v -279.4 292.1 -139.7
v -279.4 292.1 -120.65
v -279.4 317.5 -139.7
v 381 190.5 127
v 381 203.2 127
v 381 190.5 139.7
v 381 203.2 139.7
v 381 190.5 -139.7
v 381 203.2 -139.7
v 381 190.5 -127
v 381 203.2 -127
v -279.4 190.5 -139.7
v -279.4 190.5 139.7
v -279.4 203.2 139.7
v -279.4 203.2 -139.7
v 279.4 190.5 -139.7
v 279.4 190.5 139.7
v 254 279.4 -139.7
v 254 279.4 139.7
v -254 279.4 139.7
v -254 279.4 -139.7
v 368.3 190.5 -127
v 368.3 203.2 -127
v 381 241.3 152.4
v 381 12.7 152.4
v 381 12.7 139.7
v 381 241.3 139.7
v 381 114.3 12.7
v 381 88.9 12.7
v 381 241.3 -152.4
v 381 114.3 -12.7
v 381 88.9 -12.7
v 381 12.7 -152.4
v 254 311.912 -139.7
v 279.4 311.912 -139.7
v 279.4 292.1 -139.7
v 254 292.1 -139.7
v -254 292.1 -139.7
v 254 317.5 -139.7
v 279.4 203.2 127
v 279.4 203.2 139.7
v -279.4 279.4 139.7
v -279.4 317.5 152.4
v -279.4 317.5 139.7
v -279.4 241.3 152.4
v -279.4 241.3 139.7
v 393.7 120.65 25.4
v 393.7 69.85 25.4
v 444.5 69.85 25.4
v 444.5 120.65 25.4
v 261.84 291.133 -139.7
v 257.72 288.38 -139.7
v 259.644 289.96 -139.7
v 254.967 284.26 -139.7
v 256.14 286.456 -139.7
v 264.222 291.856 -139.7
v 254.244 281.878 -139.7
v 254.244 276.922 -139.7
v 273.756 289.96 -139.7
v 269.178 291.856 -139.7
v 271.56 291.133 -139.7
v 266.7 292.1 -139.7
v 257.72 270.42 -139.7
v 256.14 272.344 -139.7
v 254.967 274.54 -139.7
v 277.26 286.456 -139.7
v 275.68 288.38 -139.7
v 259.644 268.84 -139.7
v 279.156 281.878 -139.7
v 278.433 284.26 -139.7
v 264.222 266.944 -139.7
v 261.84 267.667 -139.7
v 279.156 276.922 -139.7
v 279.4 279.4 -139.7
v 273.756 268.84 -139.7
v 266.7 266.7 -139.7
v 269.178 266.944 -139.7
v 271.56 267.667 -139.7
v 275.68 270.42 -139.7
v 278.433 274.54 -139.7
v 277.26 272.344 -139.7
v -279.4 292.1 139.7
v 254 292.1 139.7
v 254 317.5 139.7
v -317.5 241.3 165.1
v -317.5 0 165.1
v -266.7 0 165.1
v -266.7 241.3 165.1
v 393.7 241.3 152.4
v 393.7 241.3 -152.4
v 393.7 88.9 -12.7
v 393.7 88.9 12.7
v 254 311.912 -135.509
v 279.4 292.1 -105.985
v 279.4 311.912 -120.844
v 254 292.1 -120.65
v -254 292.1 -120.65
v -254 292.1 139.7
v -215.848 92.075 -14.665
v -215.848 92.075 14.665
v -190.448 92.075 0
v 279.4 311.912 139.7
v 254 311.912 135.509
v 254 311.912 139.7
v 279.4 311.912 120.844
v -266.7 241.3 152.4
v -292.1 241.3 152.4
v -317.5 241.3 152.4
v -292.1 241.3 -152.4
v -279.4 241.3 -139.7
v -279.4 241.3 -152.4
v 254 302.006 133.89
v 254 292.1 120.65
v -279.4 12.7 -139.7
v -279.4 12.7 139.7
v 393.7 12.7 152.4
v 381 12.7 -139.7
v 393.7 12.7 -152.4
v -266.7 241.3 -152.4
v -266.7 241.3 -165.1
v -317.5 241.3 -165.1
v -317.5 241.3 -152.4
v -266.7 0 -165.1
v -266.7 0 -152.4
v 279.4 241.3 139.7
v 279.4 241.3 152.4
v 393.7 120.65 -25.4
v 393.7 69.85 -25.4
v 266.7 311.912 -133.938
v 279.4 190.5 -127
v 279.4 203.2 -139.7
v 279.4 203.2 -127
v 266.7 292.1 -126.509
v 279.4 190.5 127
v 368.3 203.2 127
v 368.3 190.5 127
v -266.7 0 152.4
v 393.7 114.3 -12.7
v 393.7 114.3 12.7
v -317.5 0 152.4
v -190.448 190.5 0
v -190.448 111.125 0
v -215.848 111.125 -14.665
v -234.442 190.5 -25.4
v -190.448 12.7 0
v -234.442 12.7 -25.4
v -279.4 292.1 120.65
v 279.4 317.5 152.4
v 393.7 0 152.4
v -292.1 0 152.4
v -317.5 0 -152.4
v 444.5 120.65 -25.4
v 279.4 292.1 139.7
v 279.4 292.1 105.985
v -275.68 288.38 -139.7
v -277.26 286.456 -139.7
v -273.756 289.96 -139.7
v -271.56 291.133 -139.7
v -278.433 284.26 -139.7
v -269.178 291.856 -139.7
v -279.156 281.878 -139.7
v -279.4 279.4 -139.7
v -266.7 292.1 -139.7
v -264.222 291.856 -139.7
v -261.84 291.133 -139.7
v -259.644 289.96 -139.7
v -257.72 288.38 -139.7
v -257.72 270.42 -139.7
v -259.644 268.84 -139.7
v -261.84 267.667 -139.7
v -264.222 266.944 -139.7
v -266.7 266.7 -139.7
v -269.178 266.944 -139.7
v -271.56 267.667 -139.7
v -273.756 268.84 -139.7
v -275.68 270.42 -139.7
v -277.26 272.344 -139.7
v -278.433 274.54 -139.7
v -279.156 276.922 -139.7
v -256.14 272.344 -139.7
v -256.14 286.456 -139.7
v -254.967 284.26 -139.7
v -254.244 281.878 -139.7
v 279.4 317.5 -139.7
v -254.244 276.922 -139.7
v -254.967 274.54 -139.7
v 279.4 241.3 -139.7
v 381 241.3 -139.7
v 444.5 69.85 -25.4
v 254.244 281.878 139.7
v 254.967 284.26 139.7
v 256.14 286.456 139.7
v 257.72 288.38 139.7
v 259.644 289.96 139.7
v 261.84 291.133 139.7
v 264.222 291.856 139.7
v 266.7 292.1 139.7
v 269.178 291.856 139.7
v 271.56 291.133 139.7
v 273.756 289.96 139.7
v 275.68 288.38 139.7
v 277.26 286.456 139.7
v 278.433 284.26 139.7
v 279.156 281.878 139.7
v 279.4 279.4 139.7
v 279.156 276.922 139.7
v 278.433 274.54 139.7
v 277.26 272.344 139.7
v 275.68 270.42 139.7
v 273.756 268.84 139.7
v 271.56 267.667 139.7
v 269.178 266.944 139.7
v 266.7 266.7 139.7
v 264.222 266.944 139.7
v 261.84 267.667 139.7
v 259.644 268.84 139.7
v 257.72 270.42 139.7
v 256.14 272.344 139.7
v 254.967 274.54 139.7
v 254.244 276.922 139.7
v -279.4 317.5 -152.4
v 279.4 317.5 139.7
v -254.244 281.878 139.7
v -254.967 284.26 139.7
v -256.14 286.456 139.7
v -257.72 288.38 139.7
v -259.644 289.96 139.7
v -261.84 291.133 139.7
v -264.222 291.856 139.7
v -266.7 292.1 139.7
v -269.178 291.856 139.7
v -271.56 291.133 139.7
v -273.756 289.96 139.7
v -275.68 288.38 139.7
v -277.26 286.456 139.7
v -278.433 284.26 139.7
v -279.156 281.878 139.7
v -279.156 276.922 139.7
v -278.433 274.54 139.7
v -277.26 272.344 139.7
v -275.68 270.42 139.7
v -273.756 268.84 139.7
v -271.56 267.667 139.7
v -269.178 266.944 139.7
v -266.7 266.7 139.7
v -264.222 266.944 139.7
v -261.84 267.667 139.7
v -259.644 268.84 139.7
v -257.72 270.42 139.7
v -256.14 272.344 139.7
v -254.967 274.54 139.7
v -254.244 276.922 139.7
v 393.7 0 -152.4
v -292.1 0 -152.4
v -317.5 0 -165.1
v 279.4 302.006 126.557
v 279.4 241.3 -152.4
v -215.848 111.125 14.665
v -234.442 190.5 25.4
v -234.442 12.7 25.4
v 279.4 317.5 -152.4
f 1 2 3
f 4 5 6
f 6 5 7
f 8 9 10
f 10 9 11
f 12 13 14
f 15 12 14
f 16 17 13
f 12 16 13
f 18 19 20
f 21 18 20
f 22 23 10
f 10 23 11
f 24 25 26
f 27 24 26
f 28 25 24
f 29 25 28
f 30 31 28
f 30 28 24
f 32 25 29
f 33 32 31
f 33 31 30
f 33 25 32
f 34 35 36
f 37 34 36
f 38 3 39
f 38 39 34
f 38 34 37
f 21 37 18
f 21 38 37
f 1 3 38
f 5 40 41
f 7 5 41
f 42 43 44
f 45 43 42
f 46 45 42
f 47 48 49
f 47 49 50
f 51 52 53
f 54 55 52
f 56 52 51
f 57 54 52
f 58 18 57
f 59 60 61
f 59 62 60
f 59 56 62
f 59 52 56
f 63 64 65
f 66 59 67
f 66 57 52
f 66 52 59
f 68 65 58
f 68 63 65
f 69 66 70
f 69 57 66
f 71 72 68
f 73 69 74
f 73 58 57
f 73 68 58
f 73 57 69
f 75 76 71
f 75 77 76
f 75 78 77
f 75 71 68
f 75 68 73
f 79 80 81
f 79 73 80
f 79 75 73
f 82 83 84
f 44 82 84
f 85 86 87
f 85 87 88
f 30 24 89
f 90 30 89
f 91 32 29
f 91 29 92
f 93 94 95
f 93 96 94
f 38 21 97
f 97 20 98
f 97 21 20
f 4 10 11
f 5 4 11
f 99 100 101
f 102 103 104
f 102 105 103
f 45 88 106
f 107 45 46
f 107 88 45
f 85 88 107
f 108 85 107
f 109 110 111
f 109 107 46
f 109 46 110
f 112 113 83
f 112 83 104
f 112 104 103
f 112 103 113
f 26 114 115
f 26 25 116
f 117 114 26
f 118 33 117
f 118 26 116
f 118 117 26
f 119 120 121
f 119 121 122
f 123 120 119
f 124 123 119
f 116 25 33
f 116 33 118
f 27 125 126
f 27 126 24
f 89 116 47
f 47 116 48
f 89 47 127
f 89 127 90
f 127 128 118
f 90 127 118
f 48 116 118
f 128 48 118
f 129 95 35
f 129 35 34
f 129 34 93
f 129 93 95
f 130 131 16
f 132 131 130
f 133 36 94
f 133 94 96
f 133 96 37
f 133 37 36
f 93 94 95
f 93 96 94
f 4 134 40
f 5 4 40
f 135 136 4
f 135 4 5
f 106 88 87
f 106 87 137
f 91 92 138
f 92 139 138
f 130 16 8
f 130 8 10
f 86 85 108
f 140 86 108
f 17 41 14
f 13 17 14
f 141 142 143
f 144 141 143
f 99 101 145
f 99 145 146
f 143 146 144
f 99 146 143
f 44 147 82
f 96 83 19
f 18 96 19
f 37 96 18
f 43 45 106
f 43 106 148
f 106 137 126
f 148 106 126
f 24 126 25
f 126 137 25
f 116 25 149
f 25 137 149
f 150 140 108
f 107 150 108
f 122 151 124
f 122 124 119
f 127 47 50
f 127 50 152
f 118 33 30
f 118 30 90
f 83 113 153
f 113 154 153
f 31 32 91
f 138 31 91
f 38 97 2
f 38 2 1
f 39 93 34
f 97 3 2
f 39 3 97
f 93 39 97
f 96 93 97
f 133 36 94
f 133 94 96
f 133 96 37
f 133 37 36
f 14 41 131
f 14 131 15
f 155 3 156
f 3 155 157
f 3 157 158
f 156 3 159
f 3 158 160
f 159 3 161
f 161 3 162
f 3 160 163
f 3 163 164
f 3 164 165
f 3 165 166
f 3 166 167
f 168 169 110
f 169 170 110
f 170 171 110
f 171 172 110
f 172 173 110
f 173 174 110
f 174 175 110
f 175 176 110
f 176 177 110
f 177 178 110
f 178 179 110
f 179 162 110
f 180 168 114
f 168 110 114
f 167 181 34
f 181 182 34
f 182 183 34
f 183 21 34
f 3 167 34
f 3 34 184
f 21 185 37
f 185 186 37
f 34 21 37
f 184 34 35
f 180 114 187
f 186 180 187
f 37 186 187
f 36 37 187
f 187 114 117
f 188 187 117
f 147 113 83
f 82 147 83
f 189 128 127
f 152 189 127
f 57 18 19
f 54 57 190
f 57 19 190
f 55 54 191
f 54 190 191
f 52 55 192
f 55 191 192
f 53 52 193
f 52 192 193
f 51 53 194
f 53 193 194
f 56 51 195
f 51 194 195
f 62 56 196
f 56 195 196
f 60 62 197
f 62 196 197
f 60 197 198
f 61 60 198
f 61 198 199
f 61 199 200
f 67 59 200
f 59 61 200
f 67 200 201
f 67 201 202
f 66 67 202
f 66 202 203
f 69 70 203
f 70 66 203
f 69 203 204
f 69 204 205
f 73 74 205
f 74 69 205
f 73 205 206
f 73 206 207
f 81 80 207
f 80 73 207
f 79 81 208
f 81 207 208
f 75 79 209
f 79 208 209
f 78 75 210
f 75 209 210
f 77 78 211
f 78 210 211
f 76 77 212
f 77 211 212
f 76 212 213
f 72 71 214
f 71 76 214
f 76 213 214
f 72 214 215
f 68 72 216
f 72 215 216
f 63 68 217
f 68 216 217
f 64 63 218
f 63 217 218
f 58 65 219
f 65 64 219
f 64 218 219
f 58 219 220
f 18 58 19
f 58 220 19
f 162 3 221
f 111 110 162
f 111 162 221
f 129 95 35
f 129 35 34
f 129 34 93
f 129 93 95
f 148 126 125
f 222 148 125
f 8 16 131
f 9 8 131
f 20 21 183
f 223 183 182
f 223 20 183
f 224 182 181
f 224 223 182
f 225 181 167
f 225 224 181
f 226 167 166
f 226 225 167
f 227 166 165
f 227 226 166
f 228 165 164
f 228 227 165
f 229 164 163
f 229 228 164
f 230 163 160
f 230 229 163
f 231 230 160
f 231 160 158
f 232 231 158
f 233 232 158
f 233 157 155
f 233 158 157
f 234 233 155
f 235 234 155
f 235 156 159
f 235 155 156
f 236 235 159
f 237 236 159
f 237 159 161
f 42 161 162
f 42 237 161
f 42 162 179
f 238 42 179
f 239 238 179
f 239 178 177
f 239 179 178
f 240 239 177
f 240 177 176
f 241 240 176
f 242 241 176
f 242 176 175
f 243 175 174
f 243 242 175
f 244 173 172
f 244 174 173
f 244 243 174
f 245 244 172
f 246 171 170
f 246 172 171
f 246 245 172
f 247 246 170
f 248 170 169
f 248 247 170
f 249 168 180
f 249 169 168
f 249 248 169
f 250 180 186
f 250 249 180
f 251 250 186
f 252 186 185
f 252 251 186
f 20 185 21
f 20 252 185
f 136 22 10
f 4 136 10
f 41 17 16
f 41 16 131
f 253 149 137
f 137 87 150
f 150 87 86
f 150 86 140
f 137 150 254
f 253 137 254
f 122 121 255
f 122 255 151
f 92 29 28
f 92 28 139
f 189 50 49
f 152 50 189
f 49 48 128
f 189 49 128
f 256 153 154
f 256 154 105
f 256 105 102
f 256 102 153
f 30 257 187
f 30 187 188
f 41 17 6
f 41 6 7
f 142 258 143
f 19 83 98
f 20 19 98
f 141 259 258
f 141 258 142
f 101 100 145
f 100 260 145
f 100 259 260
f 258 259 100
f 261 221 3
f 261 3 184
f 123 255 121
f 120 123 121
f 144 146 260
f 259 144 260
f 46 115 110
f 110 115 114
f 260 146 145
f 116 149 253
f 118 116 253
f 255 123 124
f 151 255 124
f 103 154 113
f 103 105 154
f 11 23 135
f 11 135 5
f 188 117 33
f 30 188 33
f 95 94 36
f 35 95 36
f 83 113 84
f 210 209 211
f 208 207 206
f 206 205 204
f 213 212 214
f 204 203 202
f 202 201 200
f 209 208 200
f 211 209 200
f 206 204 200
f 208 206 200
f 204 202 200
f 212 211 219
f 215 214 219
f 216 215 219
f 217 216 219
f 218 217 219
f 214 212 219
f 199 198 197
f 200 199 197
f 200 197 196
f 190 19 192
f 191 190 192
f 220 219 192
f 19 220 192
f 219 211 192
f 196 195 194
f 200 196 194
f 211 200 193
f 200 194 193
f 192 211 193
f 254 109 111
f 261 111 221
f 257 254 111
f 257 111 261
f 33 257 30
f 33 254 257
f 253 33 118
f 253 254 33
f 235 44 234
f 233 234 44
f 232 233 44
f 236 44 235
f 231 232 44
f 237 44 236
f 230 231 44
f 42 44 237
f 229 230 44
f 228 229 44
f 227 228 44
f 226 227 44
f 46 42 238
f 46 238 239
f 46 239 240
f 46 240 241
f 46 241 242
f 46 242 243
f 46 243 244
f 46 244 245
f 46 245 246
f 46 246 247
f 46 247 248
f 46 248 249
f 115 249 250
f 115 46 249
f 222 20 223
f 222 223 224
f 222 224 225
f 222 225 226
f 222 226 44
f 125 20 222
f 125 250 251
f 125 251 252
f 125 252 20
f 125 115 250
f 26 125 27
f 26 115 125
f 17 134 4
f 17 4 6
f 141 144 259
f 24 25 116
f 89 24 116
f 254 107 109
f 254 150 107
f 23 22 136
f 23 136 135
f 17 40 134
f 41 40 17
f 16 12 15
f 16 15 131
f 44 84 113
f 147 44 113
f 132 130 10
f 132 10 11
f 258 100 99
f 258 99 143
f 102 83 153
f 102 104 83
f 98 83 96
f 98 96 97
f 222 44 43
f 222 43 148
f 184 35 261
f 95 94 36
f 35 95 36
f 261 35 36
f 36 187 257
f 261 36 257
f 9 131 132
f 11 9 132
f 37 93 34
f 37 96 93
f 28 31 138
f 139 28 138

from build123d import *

# Parameters (mm, degrees)
SKETCH1_W                             = 584.2
SKETCH1_H                             = 304.8
SKETCH1_W_2                           = 101.6
FOND_DEPTH                            = 12.7
SKETCH2_W                             = 660.4
SKETCH2_H                             = 12.7
COT_S_HAUT_DEPTH                      = 228.6
COT_S_HAUT_2_DEPTH                    = 228.6
SKETCH3_W                             = 12.7
SKETCH3_H                             = 304.8
COT_ES_BAS_DEPTH                      = 228.6
COT_ES_BAS_2_DEPTH                    = 228.6
SKETCH4_W                             = 558.8
SKETCH4_H                             = 12.7
SUPPORT_CAGE_DEPTH                    = 76.2
SKETCH5_W                             = 12.7
SKETCH5_H                             = 12.7
SUPPORT_TRAPPE_COT_ES_DEPTH           = 101.6
SUPPORT_TRAPPE_COT_ES_2_DEPTH         = 101.6
SUPPORT_TRAPPE_DEVANT_REACH           = 579.815
SKETCH6_W                             = 12.7
SKETCH6_H                             = 12.7
PLANCHER_MILLIEU_REACH                = 586.062
SKETCH7_W                             = 558.8
SKETCH7_H                             = 12.7
ROULEAU_REACH                         = 586.062
SKETCH8_R                             = 12.7
SKETCH10_W                            = 508
SKETCH10_H                            = 12.7
SOUTIEN_TAPIS_DEPTH                   = 279.4
REBORD_START                          = -25.4
REBORD_TAPIS_DEPTH                    = 533.4
V_POUR_VIS_SANS_FIN_DEPTH             = 177.8
TROU_V_VIS_SANS_FIN_REACH             = 530.235
SKETCH17_W                            = 25.4
SKETCH17_H                            = 19.05
TROU_V_VIS_SANS_FIN_DIRECTION_2_REACH = 530.235
TROU_SORTIE_VIS_SANS_FIN_DEPTH        = 12.7
TROU_SORTIE_VIS_SANS_FIN_DEPTH_BACK   = 12.7
SKETCH18_W                            = 12.7
SKETCH18_H                            = 25.4
SKETCH19_W                            = 12.7
SKETCH19_H                            = 241.3
REBORD_POUR_SAC_POUBELLE_DEPTH        = 25.4
SKETCH31_W                            = 50.8
SKETCH31_H                            = 50.8
BOITE_MOTEUR_VIS_SANS_DEPTH           = 50.8


with BuildPart() as part:
    # Sketch1 → Fond (new body)
    with BuildSketch(Plane(origin=(0, 0, 0), x_dir=(1, 0, 0), z_dir=(0, 1, 0))):
        Rectangle(SKETCH1_W, SKETCH1_H)
        with Locations((342.9, 0)):
            Rectangle(SKETCH1_W_2, SKETCH1_H)
    extrude(amount=FOND_DEPTH)


with BuildPart() as body_2:
    # Sketch2 → Cotés Haut (new body)
    with BuildSketch(Plane(origin=(0, 12.7, 0), x_dir=(1, 0, 0), z_dir=(0, 1, 0))):
        with Locations((50.8, 146.05)):
            Rectangle(SKETCH2_W, SKETCH2_H)
    extrude(amount=COT_S_HAUT_DEPTH)



with BuildPart() as body_3:
    # Sketch2 → Cot_s Haut 2 (new body)
    with BuildSketch(Plane(origin=(0, 12.7, 0), x_dir=(1, 0, 0), z_dir=(0, 1, 0))):
        with Locations((50.8, -146.05)):
            Rectangle(SKETCH2_W, SKETCH2_H)
    extrude(amount=COT_S_HAUT_2_DEPTH)


with BuildPart() as body_4:
    # Sketch3 → Cotées Bas (new body)
    with BuildSketch(Plane(origin=(0, 12.7, 0), x_dir=(1, 0, 0), z_dir=(0, 1, 0))):
        with Locations((-285.75, 0)):
            Rectangle(SKETCH3_W, SKETCH3_H)
    extrude(amount=COT_ES_BAS_DEPTH)


with BuildPart() as body_5:
    # Sketch3 → Cot_es Bas 2 (new body)
    with BuildSketch(Plane(origin=(0, 12.7, 0), x_dir=(1, 0, 0), z_dir=(0, 1, 0))):
        with Locations((387.35, 0)):
            Rectangle(SKETCH3_W, SKETCH3_H)
    extrude(amount=COT_ES_BAS_2_DEPTH)

    # Sketch18 → Trou sortie vis sans fin (cut, two sides: drawn at the far end of the back side and taken through both)
    with BuildSketch(Plane.XY.offset(-TROU_SORTIE_VIS_SANS_FIN_DEPTH_BACK)):
        with Locations((387.35, 101.6)):
            Rectangle(SKETCH18_W, SKETCH18_H)
    extrude(amount=TROU_SORTIE_VIS_SANS_FIN_DEPTH + TROU_SORTIE_VIS_SANS_FIN_DEPTH_BACK, mode=Mode.SUBTRACT)

    # Sketch31 → Boite moteur vis sans (add)
    with BuildSketch(Plane(origin=(393.7, 0, 0), x_dir=(0, 0, -1), z_dir=(1, 0, 0))):
        with Locations((0, 95.25)):
            Rectangle(SKETCH31_W, SKETCH31_H)
    extrude(amount=BOITE_MOTEUR_VIS_SANS_DEPTH)


with BuildPart() as body_2_1:
    add(body_2.part)

    add(body_3.part)  # Support Cage merges body 3
    # Sketch4 → Support Cage (add)
    with BuildSketch(Plane(origin=(0, 241.3, 0), x_dir=(1, 0, 0), z_dir=(0, 1, 0))):
        with Locations((0, 146.05)):
            Rectangle(SKETCH4_W, SKETCH4_H)
        with Locations((0, -146.05)):
            Rectangle(SKETCH4_W, SKETCH4_H)
    extrude(amount=SUPPORT_CAGE_DEPTH)


with BuildPart() as body_5_2:
    # Sketch5 → Support Trappe cotées (new body)
    with BuildSketch(Plane.ZY.offset(-381)):
        with Locations((-133.35, 196.85)):
            Rectangle(SKETCH5_W, SKETCH5_H)
    extrude(amount=SUPPORT_TRAPPE_COT_ES_DEPTH)


with BuildPart() as body_6:
    # Sketch5 → Support Trappe cot_es 2 (new body)
    with BuildSketch(Plane.ZY.offset(-381)):
        with Locations((133.35, 196.85)):
            Rectangle(SKETCH5_W, SKETCH5_H)
    extrude(amount=SUPPORT_TRAPPE_COT_ES_2_DEPTH)


with BuildPart() as body_7:

    # Sketch6 → Support Trappe devant (new, up to next)
    with BuildSketch(Plane.XY.offset(-127), mode=Mode.PRIVATE) as support_trappe_devant_sk1:
        with Locations((374.65, 196.85)):
            Rectangle(SKETCH6_W, SKETCH6_H)
    support_trappe_devant_tool1 = extrude(support_trappe_devant_sk1.sketch, amount=SUPPORT_TRAPPE_DEVANT_REACH, mode=Mode.PRIVATE) - body_6.part
    add(support_trappe_devant_tool1.solids().sort_by_distance((374.65, 196.85, -127))[0])


with BuildPart() as body_8:

    # Sketch7 → Plancher millieu (new, up to next)
    with BuildSketch(Plane(origin=(0, 0, 139.7), x_dir=(-1, 0, 0), z_dir=(0, 0, -1)), mode=Mode.PRIVATE) as plancher_millieu_sk1:
        with Locations((0, 196.85)):
            Rectangle(SKETCH7_W, SKETCH7_H)
    plancher_millieu_tool1 = extrude(plancher_millieu_sk1.sketch, amount=PLANCHER_MILLIEU_REACH, mode=Mode.PRIVATE) - body_2_1.part
    add(plancher_millieu_tool1.solids().sort_by_distance((0, 196.85, 139.7))[0])


with BuildPart() as body_9:

    # Sketch8 → Rouleau (new, up to next)
    with BuildSketch(Plane(origin=(0, 0, 139.7), x_dir=(-1, 0, 0), z_dir=(0, 0, -1)), mode=Mode.PRIVATE) as rouleau_sk1:
        with Locations((-266.7, 279.4)):
            Circle(SKETCH8_R)
    rouleau_tool1 = extrude(rouleau_sk1.sketch, amount=ROULEAU_REACH, mode=Mode.PRIVATE) - body_2_1.part
    rouleau = rouleau_tool1.solids().sort_by_distance((266.7, 279.4, 139.7))[0]
    add(rouleau)


with BuildPart() as body_2_2:
    add(body_2_1.part)

    # Mirror1: Rouleau across plane
    add(rouleau.mirror(Plane(origin=(0, 0, 0), x_dir=(0, 0, 1), z_dir=(1, 0, 0))))

    # Mirror9 2: loft between two sections, ruled curve by curve
    mirror9_2_from = [
        Edge.make_line((279.4, 311.912, -120.844303163), (279.4, 311.912, -139.7)),
        Edge.make_line((279.4, 292.1, -139.7), (279.4, 292.1, -105.985303163)),
        Edge.make_line((279.4, 292.1, -105.985303163), (279.4, 311.912, -120.844303163)),
        Edge.make_line((279.4, 292.1, -139.7), (279.4, 311.912, -139.7)),
    ]
    mirror9_2_to = [
        Edge.make_line((254, 311.912, -135.509), (254, 311.912, -139.7)),
        Edge.make_line((254, 292.1, -139.7), (254, 292.1, -120.65)),
        Edge.make_line((254, 292.1, -120.65), (254, 311.912, -135.509)),
        Edge.make_line((254, 292.1, -139.7), (254, 311.912, -139.7)),
    ]
    mirror9_2 = Solid(Shell([*[Face.make_surface_from_curves(mirror9_2_from[k], mirror9_2_to[k]) for k in range(4)], Face(Wire(mirror9_2_from)), Face(Wire(mirror9_2_to))]))
    add(mirror9_2)


with BuildPart() as body_10:
    # Sketch10 → Soutien tapis (new body)
    with BuildSketch(Plane(origin=(0, 0, 139.7), x_dir=(-1, 0, 0), z_dir=(0, 0, -1))):
        with Locations((0, 285.75)):
            Rectangle(SKETCH10_W, SKETCH10_H)
    extrude(amount=SOUTIEN_TAPIS_DEPTH)


with BuildPart() as body_11:
    # Sketch11 → Rebord tapis (new body)
    with BuildSketch(Plane(origin=(279.4, 0, 0), x_dir=(0, 0, -1), z_dir=(1, 0, 0)).offset(REBORD_START)):
        Polygon((-139.7, 317.5), (-120.65, 292.1), (-139.7, 292.1), align=None)
    rebord_tapis = extrude(amount=-REBORD_TAPIS_DEPTH)


with BuildPart() as body_10_1:
    add(body_10.part)

    # Mirror5: Rebord tapis across plane
    add(rebord_tapis.mirror(Plane.XY))

    # Mirror9: read off the stored shape, not the designer's step
    # Mirror9: loft between two sections, ruled curve by curve
    mirror9_from = [
        Edge.make_line((279.4, 292.1, -139.7), (279.4, 292.1, -105.985303163)),
        Edge.make_line((279.4, 311.912, -120.844303163), (279.4, 311.912, -139.7)),
        Edge.make_line((279.4, 292.1, -105.985303163), (279.4, 311.912, -120.844303163)),
        Edge.make_line((279.4, 311.912, -139.7), (279.4, 292.1, -139.7)),
    ]
    mirror9_to = [
        Edge.make_line((254, 292.1, -139.7), (254, 292.1, -120.65)),
        Edge.make_line((254, 311.912, -135.509), (254, 311.912, -139.7)),
        Edge.make_line((254, 292.1, -120.65), (254, 311.912, -135.509)),
        Edge.make_line((254, 311.912, -139.7), (254, 292.1, -139.7)),
    ]
    mirror9 = Solid(Shell([*[Face.make_surface_from_curves(mirror9_from[k], mirror9_to[k]) for k in range(4)], Face(Wire(mirror9_from)), Face(Wire(mirror9_to))]))
    add(mirror9)


with BuildPart() as body_12:
    # Sketch13 → V pour vis sans fin (new body)
    with BuildSketch(Plane(origin=(0, 12.7, 0), x_dir=(1, 0, 0), z_dir=(0, 1, 0))):
        Polygon((-190.447909488, 0), (-234.442, 25.4), (-234.442, -25.4), align=None)
    extrude(amount=V_POUR_VIS_SANS_FIN_DEPTH)

    # Trou V vis sans fin: up to this face of the body (flat: up to its plane)
    trou_v_vis_sans_fin_end = Plane(body_12.part.faces().sort_by_distance((-212.444954744, 101.6, -12.7))[0])
    # Sketch17 → Trou V vis sans fin (cut, up to the picked face)
    with BuildSketch(Plane.XY, mode=Mode.PRIVATE) as trou_v_vis_sans_fin_sk1:
        with Locations((-203.147909488, 101.6)):
            Rectangle(SKETCH17_W, SKETCH17_H)
    trou_v_vis_sans_fin_tool1 = split(extrude(trou_v_vis_sans_fin_sk1.sketch, amount=-TROU_V_VIS_SANS_FIN_REACH, mode=Mode.PRIVATE), bisect_by=trou_v_vis_sans_fin_end, keep=Keep.BOTH, mode=Mode.PRIVATE)
    add(trou_v_vis_sans_fin_tool1.solids().sort_by(Axis((-203.147909, 101.6, 0), (0, 0, -1)))[0], mode=Mode.SUBTRACT)

    # Trou V vis sans fin direction 2: up to this face of the body (flat: up to its plane)
    trou_v_vis_sans_fin_direction_2_end = Plane(body_12.part.faces().sort_by_distance((-212.444954744, 101.6, 12.7))[0])
    # Sketch17 → Trou V vis sans fin direction 2 (cut, up to the picked face)
    with BuildSketch(Plane.XY, mode=Mode.PRIVATE) as trou_v_vis_sans_fin_direction_2_sk1:
        with Locations((-203.147909488, 101.6)):
            Rectangle(SKETCH17_W, SKETCH17_H)
    trou_v_vis_sans_fin_direction_2_tool1 = split(extrude(trou_v_vis_sans_fin_direction_2_sk1.sketch, amount=TROU_V_VIS_SANS_FIN_DIRECTION_2_REACH, mode=Mode.PRIVATE), bisect_by=trou_v_vis_sans_fin_direction_2_end, keep=Keep.BOTH, mode=Mode.PRIVATE)
    add(trou_v_vis_sans_fin_direction_2_tool1.solids().sort_by(Axis((-203.147909, 101.6, 0), (0, 0, 1)))[0], mode=Mode.SUBTRACT)


with BuildPart() as body_13:
    # Sketch19 → Rebord pour sac poubelle (new, symmetric)
    with BuildSketch(Plane.ZY.offset(292.1)):
        with Locations((-158.75, 120.65)):
            Rectangle(SKETCH19_W, SKETCH19_H)
    rebord_pour_sac_poubelle = extrude(amount=REBORD_POUR_SAC_POUBELLE_DEPTH, both=True)


with BuildPart() as body_14:
    # Rebord pour sac poubelle 2: read off the stored shape, not the designer's step
    # Rebord pour sac poubelle 2: loft between two sections, ruled curve by curve
    rebord_pour_sac_poubelle_2_from = [
        Edge.make_line((254, 292.1, 120.65), (254, 292.1, 139.7)),
        Edge.make_line((254, 292.1, 139.7), (279.4, 292.1, 139.7)),
        Edge.make_line((279.4, 292.1, 105.985303163), (254, 292.1, 120.65)),
        Edge.make_line((279.4, 292.1, 139.7), (279.4, 292.1, 105.985303163)),
    ]
    rebord_pour_sac_poubelle_2_to = [
        Edge.make_line((254, 311.912, 135.509), (254, 311.912, 139.7)),
        Edge.make_line((254, 311.912, 139.7), (279.4, 311.912, 139.7)),
        Edge.make_line((279.4, 311.912, 120.844303163), (254, 311.912, 135.509)),
        Edge.make_line((279.4, 311.912, 139.7), (279.4, 311.912, 120.844303163)),
    ]
    rebord_pour_sac_poubelle_2 = Solid(Shell([*[Face.make_surface_from_curves(rebord_pour_sac_poubelle_2_from[k], rebord_pour_sac_poubelle_2_to[k]) for k in range(4)], Face(Wire(rebord_pour_sac_poubelle_2_from)), Face(Wire(rebord_pour_sac_poubelle_2_to))]))
    add(rebord_pour_sac_poubelle_2)


with BuildPart() as part_1:
    add(part.part)

    add(body_2_2.part)  # Mirror11 merges body 2

    add(body_4.part)  # Mirror11 merges body 4
    # Mirror11: Rebord pour sac poubelle across plane
    add(rebord_pour_sac_poubelle.mirror(Plane.XY))


solid = Compound([body_5.part, body_5_2.part, body_6.part, body_7.part, body_8.part, body_9.part, body_11.part, body_10_1.part, body_12.part, body_13.part, body_14.part, part_1.part])
